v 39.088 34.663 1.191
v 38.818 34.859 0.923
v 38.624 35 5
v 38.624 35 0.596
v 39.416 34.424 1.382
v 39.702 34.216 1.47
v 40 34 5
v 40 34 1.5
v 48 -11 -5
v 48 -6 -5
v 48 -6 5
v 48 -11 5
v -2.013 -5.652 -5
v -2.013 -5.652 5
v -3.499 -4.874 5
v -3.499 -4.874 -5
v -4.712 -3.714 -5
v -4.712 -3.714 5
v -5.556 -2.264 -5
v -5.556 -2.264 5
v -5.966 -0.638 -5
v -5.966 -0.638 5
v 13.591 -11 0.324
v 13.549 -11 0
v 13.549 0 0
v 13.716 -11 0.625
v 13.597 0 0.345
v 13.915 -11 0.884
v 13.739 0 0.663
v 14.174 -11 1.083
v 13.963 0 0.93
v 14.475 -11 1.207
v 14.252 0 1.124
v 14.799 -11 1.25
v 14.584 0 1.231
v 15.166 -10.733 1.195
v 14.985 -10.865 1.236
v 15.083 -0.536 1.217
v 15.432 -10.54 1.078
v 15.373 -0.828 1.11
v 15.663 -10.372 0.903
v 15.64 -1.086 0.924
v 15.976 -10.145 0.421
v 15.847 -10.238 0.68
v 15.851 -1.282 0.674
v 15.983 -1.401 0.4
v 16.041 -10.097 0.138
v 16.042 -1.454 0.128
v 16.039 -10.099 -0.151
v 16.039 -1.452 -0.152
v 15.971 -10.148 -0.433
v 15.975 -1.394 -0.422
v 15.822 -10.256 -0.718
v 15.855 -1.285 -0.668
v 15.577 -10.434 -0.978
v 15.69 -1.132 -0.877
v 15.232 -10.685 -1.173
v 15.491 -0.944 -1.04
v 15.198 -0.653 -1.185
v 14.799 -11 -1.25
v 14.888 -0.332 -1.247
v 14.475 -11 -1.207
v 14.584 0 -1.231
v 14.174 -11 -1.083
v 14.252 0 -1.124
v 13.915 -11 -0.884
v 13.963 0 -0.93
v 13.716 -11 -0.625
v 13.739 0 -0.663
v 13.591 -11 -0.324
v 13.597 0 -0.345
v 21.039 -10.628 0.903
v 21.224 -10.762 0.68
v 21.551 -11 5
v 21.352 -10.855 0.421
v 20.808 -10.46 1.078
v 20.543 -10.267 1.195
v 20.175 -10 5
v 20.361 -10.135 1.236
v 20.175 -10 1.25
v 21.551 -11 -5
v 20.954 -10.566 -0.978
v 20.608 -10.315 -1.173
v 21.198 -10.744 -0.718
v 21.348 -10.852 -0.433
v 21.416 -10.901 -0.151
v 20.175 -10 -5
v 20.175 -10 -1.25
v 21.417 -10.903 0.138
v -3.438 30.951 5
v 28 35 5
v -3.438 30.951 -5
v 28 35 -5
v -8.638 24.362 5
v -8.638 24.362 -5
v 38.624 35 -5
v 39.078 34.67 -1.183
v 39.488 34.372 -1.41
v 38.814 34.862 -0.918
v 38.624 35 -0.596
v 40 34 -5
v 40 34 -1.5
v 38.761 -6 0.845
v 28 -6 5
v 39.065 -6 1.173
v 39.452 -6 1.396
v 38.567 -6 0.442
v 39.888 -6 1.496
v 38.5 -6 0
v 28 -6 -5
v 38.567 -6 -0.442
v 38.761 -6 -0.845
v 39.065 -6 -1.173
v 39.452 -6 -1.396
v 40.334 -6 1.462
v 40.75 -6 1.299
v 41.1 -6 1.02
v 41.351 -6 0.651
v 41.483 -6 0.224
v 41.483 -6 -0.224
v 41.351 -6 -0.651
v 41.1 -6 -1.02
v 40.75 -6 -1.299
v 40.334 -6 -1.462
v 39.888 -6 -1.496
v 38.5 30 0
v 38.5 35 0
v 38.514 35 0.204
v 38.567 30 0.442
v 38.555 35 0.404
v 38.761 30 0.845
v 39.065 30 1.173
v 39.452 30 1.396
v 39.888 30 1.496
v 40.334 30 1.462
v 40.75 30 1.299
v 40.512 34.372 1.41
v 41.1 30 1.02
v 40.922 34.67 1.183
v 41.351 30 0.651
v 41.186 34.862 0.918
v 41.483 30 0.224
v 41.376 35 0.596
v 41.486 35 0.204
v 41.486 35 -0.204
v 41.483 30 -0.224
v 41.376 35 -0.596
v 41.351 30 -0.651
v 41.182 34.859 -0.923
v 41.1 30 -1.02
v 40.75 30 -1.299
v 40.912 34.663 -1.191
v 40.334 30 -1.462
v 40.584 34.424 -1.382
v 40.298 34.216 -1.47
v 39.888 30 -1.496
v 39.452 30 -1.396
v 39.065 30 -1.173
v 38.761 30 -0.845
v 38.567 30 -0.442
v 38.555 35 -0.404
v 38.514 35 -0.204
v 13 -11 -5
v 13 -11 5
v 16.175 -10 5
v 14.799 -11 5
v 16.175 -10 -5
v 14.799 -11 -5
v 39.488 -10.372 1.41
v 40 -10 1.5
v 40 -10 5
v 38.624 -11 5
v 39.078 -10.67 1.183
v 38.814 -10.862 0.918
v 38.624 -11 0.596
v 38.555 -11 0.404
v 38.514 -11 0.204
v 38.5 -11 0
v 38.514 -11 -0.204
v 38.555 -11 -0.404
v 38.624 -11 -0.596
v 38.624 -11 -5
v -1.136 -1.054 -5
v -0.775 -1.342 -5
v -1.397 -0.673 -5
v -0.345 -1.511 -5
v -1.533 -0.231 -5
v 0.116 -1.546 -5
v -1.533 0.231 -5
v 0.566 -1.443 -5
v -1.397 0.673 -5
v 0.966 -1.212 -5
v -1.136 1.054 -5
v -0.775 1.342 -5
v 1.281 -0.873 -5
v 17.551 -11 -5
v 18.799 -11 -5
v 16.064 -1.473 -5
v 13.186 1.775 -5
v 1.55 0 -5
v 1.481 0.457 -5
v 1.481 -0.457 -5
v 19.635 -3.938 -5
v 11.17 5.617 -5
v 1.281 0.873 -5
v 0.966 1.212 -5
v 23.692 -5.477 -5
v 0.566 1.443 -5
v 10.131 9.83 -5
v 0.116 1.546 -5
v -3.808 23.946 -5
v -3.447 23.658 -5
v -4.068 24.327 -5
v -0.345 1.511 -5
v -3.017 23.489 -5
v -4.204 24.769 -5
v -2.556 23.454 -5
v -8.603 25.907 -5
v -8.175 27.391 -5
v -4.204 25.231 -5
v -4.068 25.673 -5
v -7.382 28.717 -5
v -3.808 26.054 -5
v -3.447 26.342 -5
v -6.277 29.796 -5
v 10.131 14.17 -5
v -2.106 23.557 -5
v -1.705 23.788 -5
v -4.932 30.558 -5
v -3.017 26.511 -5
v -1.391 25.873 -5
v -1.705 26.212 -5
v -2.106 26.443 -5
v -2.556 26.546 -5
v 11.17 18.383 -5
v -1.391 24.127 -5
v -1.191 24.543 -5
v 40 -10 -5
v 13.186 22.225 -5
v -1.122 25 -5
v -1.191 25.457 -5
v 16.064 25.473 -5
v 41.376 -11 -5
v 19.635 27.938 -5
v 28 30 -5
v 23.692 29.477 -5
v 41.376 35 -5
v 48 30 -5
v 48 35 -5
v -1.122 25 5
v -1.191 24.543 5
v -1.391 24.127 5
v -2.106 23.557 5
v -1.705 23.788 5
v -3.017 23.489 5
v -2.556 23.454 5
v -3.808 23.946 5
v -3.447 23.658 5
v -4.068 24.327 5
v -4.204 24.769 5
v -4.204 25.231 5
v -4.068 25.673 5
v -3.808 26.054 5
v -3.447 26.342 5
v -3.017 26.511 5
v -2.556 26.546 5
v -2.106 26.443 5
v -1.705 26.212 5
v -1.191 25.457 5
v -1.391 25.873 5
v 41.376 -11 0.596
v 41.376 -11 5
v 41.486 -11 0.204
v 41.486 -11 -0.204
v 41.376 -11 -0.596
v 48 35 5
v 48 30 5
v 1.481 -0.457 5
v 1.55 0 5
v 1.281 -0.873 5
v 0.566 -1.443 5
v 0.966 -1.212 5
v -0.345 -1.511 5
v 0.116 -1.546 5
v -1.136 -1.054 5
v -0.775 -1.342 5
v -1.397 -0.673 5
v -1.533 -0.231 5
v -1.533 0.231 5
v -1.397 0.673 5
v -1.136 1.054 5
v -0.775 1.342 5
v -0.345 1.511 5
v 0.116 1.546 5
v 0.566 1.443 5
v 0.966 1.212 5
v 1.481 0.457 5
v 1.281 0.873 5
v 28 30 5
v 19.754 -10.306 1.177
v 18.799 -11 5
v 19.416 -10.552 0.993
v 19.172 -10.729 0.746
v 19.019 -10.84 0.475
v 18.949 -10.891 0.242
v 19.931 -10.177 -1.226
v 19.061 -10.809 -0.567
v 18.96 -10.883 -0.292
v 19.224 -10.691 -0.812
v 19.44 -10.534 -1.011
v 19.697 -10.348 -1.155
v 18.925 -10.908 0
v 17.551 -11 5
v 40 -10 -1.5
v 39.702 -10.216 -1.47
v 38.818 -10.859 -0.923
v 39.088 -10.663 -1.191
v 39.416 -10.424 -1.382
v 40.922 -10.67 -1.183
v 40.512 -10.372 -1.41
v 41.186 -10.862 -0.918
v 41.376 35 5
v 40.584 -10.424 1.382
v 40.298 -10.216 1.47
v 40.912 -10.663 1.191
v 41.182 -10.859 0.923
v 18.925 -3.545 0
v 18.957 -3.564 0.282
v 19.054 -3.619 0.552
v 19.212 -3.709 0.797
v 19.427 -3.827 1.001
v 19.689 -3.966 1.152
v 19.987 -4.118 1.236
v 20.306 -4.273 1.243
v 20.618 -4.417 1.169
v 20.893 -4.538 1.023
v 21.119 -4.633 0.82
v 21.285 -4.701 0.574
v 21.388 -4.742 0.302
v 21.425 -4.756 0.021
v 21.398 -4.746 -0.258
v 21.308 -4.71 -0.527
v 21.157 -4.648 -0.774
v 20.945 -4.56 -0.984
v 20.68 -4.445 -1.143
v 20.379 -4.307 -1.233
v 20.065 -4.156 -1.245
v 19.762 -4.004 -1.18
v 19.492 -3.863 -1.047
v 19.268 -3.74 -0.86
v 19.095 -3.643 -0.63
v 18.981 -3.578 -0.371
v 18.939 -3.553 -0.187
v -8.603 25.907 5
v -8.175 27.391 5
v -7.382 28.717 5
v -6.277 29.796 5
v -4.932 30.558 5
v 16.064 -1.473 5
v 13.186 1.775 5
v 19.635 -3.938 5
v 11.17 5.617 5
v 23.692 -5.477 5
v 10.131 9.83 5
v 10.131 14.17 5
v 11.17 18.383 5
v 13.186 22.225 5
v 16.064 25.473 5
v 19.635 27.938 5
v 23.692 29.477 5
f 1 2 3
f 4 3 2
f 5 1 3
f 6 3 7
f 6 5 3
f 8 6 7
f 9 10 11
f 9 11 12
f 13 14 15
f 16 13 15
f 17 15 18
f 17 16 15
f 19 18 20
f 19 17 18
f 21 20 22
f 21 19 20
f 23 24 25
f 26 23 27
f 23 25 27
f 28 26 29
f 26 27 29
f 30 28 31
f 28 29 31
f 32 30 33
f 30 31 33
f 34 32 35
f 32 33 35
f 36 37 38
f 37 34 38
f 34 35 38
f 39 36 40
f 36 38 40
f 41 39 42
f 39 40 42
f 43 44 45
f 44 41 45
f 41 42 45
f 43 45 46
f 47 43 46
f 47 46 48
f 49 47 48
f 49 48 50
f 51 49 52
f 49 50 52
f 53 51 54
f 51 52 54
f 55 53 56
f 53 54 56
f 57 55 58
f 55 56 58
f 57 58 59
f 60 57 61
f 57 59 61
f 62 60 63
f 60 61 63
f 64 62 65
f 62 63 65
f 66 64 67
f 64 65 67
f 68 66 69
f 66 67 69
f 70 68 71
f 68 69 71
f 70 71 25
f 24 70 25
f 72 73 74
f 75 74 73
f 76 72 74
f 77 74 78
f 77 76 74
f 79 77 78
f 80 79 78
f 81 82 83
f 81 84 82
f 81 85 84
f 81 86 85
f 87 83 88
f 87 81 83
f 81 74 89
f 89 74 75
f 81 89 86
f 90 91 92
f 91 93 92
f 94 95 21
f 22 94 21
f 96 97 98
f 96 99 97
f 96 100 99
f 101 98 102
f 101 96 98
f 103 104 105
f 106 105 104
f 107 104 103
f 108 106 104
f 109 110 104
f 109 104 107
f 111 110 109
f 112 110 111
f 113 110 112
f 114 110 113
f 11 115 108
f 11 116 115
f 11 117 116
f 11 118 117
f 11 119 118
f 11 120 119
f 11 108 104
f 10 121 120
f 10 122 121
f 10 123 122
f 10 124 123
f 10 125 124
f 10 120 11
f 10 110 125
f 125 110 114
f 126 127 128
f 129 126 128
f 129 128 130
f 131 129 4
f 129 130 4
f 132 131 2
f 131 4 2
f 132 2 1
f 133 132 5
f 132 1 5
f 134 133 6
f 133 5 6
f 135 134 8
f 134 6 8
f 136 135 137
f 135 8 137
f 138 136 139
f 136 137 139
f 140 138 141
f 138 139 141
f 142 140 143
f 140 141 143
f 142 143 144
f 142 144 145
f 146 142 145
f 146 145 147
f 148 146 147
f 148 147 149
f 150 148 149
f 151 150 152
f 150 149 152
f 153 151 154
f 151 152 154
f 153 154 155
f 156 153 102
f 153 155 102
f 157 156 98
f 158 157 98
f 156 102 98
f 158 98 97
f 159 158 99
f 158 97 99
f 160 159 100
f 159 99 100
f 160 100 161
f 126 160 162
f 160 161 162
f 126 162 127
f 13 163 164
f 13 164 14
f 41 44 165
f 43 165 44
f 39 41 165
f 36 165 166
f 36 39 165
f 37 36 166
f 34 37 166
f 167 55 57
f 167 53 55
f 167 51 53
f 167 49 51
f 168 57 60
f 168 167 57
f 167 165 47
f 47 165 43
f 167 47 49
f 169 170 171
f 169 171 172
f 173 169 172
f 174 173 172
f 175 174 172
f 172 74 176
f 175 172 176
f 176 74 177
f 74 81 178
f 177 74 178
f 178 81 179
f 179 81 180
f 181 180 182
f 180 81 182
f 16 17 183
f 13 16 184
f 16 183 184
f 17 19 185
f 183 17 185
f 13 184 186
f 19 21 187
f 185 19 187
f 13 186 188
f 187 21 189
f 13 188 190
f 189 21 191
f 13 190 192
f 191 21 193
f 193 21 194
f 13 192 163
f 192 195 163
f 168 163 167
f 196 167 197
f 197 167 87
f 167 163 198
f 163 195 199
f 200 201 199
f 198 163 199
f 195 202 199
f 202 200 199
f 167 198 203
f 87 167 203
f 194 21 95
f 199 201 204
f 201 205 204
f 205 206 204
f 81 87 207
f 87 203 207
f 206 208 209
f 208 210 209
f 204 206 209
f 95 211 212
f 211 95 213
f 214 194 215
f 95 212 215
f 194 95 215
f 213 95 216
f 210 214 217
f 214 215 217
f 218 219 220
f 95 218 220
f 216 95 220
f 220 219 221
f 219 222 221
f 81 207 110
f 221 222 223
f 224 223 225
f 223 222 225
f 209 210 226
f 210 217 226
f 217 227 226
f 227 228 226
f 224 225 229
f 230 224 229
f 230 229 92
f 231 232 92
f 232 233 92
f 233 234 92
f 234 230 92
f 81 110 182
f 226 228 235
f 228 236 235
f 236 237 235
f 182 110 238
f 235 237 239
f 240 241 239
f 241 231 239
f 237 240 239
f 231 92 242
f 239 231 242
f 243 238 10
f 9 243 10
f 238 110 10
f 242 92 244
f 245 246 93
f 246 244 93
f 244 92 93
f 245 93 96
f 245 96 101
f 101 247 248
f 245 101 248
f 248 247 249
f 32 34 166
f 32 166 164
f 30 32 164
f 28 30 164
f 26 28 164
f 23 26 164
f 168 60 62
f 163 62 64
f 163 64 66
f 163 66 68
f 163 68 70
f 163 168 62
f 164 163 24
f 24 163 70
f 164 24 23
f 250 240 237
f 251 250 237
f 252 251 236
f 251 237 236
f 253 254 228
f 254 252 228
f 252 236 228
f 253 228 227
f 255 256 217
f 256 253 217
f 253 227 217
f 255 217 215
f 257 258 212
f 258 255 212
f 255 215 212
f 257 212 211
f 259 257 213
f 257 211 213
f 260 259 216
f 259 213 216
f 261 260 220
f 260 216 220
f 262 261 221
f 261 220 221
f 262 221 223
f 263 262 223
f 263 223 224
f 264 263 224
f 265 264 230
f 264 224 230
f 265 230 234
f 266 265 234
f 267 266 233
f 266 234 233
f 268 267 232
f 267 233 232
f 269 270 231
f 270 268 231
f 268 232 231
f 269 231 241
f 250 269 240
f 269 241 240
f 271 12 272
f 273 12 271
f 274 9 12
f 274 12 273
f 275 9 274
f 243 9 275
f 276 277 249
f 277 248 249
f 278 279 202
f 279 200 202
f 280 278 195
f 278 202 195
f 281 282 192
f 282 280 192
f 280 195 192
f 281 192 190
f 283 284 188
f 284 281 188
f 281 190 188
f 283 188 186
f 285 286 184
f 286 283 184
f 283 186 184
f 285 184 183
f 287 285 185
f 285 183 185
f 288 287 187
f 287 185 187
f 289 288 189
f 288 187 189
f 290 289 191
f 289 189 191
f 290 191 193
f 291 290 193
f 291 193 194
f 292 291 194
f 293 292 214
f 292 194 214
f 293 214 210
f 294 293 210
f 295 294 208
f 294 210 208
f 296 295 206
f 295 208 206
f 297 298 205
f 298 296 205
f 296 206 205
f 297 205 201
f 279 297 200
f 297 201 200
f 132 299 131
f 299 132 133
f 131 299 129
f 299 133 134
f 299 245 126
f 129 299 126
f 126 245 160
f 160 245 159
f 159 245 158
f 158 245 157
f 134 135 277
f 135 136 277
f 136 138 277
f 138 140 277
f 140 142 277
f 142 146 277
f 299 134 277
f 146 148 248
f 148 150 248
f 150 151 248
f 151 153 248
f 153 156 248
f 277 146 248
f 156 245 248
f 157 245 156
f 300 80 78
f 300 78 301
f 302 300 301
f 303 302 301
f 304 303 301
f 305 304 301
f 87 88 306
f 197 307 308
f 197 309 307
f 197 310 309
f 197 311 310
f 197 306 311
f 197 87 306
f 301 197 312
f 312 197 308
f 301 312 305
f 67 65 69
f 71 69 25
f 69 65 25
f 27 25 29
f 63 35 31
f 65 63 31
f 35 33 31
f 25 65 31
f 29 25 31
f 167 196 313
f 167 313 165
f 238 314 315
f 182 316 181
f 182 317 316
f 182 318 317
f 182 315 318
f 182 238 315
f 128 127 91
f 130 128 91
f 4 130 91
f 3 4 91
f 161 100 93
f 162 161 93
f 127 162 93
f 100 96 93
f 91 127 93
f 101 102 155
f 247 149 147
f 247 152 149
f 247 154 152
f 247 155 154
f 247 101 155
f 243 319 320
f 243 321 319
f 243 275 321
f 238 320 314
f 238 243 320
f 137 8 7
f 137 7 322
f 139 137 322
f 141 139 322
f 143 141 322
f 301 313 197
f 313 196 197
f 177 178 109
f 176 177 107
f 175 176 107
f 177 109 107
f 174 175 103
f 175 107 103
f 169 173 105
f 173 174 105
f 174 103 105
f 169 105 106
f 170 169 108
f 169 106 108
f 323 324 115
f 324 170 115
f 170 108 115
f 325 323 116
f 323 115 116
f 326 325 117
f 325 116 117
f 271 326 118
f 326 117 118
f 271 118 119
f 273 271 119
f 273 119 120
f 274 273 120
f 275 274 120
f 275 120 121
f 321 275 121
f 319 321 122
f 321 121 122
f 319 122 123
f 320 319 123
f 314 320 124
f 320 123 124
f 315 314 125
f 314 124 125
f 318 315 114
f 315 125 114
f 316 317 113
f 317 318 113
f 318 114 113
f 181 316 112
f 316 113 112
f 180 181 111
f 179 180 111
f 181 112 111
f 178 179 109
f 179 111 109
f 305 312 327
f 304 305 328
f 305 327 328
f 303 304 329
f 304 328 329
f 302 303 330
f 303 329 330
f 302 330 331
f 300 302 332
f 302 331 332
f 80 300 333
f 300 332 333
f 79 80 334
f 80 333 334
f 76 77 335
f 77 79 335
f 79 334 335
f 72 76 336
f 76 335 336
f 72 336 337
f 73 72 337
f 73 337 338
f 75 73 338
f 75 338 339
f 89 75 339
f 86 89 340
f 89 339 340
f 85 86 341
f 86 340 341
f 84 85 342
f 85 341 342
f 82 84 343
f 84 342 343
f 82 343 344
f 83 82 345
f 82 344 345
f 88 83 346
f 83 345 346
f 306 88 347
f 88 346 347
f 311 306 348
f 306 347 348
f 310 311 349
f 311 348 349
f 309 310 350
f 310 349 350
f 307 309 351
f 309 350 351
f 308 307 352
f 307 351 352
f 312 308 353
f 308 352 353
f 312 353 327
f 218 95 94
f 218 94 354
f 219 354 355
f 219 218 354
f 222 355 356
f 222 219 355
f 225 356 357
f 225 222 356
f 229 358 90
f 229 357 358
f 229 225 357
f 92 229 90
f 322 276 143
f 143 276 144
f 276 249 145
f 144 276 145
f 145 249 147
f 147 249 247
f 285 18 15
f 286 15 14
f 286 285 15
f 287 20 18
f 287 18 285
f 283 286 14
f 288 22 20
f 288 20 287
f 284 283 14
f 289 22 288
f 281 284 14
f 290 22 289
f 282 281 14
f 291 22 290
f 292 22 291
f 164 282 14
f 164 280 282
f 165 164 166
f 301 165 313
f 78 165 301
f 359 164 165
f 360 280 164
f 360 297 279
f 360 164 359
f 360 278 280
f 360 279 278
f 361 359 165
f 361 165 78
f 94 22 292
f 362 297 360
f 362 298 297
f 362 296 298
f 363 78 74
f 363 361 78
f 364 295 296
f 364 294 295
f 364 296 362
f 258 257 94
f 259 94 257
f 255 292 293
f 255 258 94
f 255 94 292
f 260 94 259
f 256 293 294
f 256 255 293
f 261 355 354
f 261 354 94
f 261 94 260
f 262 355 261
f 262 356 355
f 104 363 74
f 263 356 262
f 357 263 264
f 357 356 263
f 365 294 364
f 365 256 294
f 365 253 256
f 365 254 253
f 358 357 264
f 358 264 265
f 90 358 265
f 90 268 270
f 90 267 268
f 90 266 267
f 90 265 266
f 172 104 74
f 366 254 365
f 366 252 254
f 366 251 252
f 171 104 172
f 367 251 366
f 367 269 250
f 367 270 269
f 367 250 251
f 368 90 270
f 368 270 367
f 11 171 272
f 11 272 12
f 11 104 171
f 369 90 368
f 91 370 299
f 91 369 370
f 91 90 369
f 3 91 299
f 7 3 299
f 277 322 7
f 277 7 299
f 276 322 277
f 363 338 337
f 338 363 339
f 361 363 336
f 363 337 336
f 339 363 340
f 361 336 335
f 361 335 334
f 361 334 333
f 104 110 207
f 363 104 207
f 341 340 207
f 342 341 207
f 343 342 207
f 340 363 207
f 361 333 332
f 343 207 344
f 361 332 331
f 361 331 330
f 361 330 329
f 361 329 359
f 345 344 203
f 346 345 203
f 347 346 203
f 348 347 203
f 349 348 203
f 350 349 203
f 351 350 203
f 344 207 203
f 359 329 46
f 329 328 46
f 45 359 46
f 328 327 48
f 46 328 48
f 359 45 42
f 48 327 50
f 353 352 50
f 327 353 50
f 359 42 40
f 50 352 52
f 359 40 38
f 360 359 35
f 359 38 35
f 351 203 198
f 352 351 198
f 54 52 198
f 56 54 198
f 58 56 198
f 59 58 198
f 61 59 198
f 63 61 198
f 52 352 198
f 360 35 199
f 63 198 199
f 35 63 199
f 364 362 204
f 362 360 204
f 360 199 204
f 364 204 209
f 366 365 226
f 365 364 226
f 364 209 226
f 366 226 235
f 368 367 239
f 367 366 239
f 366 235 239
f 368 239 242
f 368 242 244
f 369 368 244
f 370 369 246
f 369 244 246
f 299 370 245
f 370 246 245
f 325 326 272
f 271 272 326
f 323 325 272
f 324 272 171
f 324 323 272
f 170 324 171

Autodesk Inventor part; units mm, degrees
ref_plane "YZ Plane" through (0, 0, 0) normal (1, 0, 0) x (0, 1, 0)
ref_plane "XZ Plane" through (0, 0, 0) normal (0, 1, 0) x (-1, 0, 0)
ref_plane "XY Plane" through (0, 0, 0) normal (0, 0, 1) x (1, 0, 0)
sketch "Sketch1" plane through (0, 0, 0) normal (0, 0, 1) x (1, 0, 0)
  line L0 (40, 15) -> (40, 0) construction
  circle A0 centre (-2.6718, 25) radius 1.55
  circle A1 centre (0, 0) radius 1.55
  arc A2 (2.1334, 28.593) -> (-3.4383, 30.9508) centre (-2.6718, 25) ccw construction
  arc A3 (-5.966, -0.6376) -> (-2.0133, -5.6521) centre (0, 0) ccw
  line L1 (-8.6378, 24.3624) -> (-5.966, -0.6376)
  line L2 (0, -6) -> (28, -6) construction
  line L3 (40, 0) -> (48, 0) construction
  line L4 (48, 0) -> (48, -6) construction
  line L5 (48, -6) -> (48, -11)
  line L6 (48, -11) -> (41.3764, -11)
  line L7 (13, -11) -> (-2.0133, -5.6521)
  line L8 (28, -6) -> (48, -6)
  line L9 (28, 30) -> (48, 30)
  line L10 (48, 30) -> (48, 35)
  line L11 (48, 35) -> (41.3764, 35)
  line L12 (48, -6) -> (48, 30) construction
  arc A4 (-8.6378, 24.3624) -> (2.1334, 28.593) centre (-2.6718, 25) ccw construction
  arc A5 (0, -6) -> (-5.966, -0.6376) centre (0, 0) ccw construction
  line L13 (28, -6) -> (28, 30) construction
  line L14 (28, 35) -> (-3.4383, 30.9508)
  arc A6 (-3.4383, 30.9508) -> (-8.6378, 24.3624) centre (-2.6718, 25) ccw
  line L15 (28, 35) -> (28, 30) construction
  arc A7 (28, 30) -> (28, -6) centre (28, 12) ccw
  line L16 (40, 15) -> (40, 35) construction
  line L17 (38.6236, 35) -> (40, 34)
  line L18 (40, 34) -> (41.3764, 35)
  line L19 (38.6236, 35) -> (41.3764, 35) construction
  line L20 (40, 34) -> (40, 35) construction
  line L21 (41.3764, -11) -> (40, -10)
  line L22 (40, -10) -> (38.6236, -11)
  line L23 (41.3764, -11) -> (38.6236, -11) construction
  line L24 (40, -10) -> (40, -11) construction
  line L25 (40, 0) -> (40, -11) construction
  line L26 (21.5514, -11) -> (20.175, -10)
  line L27 (20.175, -10) -> (18.7986, -11)
  line L28 (20.175, -10) -> (20.175, -11) construction
  line L29 (20.175, -10) -> (40, -10) construction
  line L30 (17.5514, -11) -> (16.175, -10)
  line L31 (16.175, -10) -> (14.7986, -11)
  line L32 (16.175, -10) -> (20.175, -10) construction
  line L33 (16.175, -10) -> (16.175, -11) construction
  line L34 (14.7986, -11) -> (13, -11)
  line L35 (17.5514, -11) -> (14.7986, -11) construction
  line L36 (21.5514, -11) -> (38.6236, -11)
  line L37 (17.5514, -11) -> (18.7986, -11)
  line L38 (18.7986, -11) -> (21.5514, -11) construction
  line L39 (38.6236, 35) -> (28, 35)
  line L40 (41.3764, 35) -> (38.6236, 35) construction
  arc A8 (-2.0133, -5.6521) -> (0, -6) centre (0, 0) ccw construction
  dimension "d0" = 3.1
  dimension "d1" = 12
  dimension "d4" = 5
  dimension "d6" = 15
  dimension "d7" = 36
  dimension "d40" = 108
  dimension "d41" = 1
  dimension "d42" = 108
  dimension "d43" = 1
  dimension "d46" = 108
  dimension "d48" = 19.825
  dimension "d49" = 108
  dimension "d51" = 4
  dimension "d52" = 12
  dimension "d53" = 8
extrude "Extrusion1" add sketch "Sketch1" along normal mid plane 10
ref_plane "Work Plane1" through (0, 0, 0) normal (0, 0, 1) x (1, 0, 0)
sketch "Sketch4" plane through (0, 0, 0) normal (0, 1, 0) x (-1, 0, 0)
  line L0 (-40, -5) -> (-40, 5) projected
  line L1 (-20.175, -5) -> (-20.175, 5) projected
  line L2 (-14.7986, -5) -> (-14.7986, 5) projected
  circle A0 centre (-40, 0) radius 1.5
  circle A1 centre (-20.175, 0) radius 1.25
  circle A2 centre (-14.7986, 0) radius 1.25
  point P0 (0, 0)
  dimension "d55" = 3
  dimension "d56" = 2.5
extrude "Extrusion4" cut sketch "Sketch4" against normal through all contours A1 L1 | L1 A1 | A2 L2 | L2 A2
extrude "Extrusion5" cut sketch "Sketch4" along normal through all both and the other way through all contours A0 L0 | L0 A0
chamfer "Chamfer1" [suppressed]
equation "\"d46\" = d42"
equation "\"d49\" = d50"
equation "\"d50\" = 108deg"
properties part number "bloco-dedo-1"
